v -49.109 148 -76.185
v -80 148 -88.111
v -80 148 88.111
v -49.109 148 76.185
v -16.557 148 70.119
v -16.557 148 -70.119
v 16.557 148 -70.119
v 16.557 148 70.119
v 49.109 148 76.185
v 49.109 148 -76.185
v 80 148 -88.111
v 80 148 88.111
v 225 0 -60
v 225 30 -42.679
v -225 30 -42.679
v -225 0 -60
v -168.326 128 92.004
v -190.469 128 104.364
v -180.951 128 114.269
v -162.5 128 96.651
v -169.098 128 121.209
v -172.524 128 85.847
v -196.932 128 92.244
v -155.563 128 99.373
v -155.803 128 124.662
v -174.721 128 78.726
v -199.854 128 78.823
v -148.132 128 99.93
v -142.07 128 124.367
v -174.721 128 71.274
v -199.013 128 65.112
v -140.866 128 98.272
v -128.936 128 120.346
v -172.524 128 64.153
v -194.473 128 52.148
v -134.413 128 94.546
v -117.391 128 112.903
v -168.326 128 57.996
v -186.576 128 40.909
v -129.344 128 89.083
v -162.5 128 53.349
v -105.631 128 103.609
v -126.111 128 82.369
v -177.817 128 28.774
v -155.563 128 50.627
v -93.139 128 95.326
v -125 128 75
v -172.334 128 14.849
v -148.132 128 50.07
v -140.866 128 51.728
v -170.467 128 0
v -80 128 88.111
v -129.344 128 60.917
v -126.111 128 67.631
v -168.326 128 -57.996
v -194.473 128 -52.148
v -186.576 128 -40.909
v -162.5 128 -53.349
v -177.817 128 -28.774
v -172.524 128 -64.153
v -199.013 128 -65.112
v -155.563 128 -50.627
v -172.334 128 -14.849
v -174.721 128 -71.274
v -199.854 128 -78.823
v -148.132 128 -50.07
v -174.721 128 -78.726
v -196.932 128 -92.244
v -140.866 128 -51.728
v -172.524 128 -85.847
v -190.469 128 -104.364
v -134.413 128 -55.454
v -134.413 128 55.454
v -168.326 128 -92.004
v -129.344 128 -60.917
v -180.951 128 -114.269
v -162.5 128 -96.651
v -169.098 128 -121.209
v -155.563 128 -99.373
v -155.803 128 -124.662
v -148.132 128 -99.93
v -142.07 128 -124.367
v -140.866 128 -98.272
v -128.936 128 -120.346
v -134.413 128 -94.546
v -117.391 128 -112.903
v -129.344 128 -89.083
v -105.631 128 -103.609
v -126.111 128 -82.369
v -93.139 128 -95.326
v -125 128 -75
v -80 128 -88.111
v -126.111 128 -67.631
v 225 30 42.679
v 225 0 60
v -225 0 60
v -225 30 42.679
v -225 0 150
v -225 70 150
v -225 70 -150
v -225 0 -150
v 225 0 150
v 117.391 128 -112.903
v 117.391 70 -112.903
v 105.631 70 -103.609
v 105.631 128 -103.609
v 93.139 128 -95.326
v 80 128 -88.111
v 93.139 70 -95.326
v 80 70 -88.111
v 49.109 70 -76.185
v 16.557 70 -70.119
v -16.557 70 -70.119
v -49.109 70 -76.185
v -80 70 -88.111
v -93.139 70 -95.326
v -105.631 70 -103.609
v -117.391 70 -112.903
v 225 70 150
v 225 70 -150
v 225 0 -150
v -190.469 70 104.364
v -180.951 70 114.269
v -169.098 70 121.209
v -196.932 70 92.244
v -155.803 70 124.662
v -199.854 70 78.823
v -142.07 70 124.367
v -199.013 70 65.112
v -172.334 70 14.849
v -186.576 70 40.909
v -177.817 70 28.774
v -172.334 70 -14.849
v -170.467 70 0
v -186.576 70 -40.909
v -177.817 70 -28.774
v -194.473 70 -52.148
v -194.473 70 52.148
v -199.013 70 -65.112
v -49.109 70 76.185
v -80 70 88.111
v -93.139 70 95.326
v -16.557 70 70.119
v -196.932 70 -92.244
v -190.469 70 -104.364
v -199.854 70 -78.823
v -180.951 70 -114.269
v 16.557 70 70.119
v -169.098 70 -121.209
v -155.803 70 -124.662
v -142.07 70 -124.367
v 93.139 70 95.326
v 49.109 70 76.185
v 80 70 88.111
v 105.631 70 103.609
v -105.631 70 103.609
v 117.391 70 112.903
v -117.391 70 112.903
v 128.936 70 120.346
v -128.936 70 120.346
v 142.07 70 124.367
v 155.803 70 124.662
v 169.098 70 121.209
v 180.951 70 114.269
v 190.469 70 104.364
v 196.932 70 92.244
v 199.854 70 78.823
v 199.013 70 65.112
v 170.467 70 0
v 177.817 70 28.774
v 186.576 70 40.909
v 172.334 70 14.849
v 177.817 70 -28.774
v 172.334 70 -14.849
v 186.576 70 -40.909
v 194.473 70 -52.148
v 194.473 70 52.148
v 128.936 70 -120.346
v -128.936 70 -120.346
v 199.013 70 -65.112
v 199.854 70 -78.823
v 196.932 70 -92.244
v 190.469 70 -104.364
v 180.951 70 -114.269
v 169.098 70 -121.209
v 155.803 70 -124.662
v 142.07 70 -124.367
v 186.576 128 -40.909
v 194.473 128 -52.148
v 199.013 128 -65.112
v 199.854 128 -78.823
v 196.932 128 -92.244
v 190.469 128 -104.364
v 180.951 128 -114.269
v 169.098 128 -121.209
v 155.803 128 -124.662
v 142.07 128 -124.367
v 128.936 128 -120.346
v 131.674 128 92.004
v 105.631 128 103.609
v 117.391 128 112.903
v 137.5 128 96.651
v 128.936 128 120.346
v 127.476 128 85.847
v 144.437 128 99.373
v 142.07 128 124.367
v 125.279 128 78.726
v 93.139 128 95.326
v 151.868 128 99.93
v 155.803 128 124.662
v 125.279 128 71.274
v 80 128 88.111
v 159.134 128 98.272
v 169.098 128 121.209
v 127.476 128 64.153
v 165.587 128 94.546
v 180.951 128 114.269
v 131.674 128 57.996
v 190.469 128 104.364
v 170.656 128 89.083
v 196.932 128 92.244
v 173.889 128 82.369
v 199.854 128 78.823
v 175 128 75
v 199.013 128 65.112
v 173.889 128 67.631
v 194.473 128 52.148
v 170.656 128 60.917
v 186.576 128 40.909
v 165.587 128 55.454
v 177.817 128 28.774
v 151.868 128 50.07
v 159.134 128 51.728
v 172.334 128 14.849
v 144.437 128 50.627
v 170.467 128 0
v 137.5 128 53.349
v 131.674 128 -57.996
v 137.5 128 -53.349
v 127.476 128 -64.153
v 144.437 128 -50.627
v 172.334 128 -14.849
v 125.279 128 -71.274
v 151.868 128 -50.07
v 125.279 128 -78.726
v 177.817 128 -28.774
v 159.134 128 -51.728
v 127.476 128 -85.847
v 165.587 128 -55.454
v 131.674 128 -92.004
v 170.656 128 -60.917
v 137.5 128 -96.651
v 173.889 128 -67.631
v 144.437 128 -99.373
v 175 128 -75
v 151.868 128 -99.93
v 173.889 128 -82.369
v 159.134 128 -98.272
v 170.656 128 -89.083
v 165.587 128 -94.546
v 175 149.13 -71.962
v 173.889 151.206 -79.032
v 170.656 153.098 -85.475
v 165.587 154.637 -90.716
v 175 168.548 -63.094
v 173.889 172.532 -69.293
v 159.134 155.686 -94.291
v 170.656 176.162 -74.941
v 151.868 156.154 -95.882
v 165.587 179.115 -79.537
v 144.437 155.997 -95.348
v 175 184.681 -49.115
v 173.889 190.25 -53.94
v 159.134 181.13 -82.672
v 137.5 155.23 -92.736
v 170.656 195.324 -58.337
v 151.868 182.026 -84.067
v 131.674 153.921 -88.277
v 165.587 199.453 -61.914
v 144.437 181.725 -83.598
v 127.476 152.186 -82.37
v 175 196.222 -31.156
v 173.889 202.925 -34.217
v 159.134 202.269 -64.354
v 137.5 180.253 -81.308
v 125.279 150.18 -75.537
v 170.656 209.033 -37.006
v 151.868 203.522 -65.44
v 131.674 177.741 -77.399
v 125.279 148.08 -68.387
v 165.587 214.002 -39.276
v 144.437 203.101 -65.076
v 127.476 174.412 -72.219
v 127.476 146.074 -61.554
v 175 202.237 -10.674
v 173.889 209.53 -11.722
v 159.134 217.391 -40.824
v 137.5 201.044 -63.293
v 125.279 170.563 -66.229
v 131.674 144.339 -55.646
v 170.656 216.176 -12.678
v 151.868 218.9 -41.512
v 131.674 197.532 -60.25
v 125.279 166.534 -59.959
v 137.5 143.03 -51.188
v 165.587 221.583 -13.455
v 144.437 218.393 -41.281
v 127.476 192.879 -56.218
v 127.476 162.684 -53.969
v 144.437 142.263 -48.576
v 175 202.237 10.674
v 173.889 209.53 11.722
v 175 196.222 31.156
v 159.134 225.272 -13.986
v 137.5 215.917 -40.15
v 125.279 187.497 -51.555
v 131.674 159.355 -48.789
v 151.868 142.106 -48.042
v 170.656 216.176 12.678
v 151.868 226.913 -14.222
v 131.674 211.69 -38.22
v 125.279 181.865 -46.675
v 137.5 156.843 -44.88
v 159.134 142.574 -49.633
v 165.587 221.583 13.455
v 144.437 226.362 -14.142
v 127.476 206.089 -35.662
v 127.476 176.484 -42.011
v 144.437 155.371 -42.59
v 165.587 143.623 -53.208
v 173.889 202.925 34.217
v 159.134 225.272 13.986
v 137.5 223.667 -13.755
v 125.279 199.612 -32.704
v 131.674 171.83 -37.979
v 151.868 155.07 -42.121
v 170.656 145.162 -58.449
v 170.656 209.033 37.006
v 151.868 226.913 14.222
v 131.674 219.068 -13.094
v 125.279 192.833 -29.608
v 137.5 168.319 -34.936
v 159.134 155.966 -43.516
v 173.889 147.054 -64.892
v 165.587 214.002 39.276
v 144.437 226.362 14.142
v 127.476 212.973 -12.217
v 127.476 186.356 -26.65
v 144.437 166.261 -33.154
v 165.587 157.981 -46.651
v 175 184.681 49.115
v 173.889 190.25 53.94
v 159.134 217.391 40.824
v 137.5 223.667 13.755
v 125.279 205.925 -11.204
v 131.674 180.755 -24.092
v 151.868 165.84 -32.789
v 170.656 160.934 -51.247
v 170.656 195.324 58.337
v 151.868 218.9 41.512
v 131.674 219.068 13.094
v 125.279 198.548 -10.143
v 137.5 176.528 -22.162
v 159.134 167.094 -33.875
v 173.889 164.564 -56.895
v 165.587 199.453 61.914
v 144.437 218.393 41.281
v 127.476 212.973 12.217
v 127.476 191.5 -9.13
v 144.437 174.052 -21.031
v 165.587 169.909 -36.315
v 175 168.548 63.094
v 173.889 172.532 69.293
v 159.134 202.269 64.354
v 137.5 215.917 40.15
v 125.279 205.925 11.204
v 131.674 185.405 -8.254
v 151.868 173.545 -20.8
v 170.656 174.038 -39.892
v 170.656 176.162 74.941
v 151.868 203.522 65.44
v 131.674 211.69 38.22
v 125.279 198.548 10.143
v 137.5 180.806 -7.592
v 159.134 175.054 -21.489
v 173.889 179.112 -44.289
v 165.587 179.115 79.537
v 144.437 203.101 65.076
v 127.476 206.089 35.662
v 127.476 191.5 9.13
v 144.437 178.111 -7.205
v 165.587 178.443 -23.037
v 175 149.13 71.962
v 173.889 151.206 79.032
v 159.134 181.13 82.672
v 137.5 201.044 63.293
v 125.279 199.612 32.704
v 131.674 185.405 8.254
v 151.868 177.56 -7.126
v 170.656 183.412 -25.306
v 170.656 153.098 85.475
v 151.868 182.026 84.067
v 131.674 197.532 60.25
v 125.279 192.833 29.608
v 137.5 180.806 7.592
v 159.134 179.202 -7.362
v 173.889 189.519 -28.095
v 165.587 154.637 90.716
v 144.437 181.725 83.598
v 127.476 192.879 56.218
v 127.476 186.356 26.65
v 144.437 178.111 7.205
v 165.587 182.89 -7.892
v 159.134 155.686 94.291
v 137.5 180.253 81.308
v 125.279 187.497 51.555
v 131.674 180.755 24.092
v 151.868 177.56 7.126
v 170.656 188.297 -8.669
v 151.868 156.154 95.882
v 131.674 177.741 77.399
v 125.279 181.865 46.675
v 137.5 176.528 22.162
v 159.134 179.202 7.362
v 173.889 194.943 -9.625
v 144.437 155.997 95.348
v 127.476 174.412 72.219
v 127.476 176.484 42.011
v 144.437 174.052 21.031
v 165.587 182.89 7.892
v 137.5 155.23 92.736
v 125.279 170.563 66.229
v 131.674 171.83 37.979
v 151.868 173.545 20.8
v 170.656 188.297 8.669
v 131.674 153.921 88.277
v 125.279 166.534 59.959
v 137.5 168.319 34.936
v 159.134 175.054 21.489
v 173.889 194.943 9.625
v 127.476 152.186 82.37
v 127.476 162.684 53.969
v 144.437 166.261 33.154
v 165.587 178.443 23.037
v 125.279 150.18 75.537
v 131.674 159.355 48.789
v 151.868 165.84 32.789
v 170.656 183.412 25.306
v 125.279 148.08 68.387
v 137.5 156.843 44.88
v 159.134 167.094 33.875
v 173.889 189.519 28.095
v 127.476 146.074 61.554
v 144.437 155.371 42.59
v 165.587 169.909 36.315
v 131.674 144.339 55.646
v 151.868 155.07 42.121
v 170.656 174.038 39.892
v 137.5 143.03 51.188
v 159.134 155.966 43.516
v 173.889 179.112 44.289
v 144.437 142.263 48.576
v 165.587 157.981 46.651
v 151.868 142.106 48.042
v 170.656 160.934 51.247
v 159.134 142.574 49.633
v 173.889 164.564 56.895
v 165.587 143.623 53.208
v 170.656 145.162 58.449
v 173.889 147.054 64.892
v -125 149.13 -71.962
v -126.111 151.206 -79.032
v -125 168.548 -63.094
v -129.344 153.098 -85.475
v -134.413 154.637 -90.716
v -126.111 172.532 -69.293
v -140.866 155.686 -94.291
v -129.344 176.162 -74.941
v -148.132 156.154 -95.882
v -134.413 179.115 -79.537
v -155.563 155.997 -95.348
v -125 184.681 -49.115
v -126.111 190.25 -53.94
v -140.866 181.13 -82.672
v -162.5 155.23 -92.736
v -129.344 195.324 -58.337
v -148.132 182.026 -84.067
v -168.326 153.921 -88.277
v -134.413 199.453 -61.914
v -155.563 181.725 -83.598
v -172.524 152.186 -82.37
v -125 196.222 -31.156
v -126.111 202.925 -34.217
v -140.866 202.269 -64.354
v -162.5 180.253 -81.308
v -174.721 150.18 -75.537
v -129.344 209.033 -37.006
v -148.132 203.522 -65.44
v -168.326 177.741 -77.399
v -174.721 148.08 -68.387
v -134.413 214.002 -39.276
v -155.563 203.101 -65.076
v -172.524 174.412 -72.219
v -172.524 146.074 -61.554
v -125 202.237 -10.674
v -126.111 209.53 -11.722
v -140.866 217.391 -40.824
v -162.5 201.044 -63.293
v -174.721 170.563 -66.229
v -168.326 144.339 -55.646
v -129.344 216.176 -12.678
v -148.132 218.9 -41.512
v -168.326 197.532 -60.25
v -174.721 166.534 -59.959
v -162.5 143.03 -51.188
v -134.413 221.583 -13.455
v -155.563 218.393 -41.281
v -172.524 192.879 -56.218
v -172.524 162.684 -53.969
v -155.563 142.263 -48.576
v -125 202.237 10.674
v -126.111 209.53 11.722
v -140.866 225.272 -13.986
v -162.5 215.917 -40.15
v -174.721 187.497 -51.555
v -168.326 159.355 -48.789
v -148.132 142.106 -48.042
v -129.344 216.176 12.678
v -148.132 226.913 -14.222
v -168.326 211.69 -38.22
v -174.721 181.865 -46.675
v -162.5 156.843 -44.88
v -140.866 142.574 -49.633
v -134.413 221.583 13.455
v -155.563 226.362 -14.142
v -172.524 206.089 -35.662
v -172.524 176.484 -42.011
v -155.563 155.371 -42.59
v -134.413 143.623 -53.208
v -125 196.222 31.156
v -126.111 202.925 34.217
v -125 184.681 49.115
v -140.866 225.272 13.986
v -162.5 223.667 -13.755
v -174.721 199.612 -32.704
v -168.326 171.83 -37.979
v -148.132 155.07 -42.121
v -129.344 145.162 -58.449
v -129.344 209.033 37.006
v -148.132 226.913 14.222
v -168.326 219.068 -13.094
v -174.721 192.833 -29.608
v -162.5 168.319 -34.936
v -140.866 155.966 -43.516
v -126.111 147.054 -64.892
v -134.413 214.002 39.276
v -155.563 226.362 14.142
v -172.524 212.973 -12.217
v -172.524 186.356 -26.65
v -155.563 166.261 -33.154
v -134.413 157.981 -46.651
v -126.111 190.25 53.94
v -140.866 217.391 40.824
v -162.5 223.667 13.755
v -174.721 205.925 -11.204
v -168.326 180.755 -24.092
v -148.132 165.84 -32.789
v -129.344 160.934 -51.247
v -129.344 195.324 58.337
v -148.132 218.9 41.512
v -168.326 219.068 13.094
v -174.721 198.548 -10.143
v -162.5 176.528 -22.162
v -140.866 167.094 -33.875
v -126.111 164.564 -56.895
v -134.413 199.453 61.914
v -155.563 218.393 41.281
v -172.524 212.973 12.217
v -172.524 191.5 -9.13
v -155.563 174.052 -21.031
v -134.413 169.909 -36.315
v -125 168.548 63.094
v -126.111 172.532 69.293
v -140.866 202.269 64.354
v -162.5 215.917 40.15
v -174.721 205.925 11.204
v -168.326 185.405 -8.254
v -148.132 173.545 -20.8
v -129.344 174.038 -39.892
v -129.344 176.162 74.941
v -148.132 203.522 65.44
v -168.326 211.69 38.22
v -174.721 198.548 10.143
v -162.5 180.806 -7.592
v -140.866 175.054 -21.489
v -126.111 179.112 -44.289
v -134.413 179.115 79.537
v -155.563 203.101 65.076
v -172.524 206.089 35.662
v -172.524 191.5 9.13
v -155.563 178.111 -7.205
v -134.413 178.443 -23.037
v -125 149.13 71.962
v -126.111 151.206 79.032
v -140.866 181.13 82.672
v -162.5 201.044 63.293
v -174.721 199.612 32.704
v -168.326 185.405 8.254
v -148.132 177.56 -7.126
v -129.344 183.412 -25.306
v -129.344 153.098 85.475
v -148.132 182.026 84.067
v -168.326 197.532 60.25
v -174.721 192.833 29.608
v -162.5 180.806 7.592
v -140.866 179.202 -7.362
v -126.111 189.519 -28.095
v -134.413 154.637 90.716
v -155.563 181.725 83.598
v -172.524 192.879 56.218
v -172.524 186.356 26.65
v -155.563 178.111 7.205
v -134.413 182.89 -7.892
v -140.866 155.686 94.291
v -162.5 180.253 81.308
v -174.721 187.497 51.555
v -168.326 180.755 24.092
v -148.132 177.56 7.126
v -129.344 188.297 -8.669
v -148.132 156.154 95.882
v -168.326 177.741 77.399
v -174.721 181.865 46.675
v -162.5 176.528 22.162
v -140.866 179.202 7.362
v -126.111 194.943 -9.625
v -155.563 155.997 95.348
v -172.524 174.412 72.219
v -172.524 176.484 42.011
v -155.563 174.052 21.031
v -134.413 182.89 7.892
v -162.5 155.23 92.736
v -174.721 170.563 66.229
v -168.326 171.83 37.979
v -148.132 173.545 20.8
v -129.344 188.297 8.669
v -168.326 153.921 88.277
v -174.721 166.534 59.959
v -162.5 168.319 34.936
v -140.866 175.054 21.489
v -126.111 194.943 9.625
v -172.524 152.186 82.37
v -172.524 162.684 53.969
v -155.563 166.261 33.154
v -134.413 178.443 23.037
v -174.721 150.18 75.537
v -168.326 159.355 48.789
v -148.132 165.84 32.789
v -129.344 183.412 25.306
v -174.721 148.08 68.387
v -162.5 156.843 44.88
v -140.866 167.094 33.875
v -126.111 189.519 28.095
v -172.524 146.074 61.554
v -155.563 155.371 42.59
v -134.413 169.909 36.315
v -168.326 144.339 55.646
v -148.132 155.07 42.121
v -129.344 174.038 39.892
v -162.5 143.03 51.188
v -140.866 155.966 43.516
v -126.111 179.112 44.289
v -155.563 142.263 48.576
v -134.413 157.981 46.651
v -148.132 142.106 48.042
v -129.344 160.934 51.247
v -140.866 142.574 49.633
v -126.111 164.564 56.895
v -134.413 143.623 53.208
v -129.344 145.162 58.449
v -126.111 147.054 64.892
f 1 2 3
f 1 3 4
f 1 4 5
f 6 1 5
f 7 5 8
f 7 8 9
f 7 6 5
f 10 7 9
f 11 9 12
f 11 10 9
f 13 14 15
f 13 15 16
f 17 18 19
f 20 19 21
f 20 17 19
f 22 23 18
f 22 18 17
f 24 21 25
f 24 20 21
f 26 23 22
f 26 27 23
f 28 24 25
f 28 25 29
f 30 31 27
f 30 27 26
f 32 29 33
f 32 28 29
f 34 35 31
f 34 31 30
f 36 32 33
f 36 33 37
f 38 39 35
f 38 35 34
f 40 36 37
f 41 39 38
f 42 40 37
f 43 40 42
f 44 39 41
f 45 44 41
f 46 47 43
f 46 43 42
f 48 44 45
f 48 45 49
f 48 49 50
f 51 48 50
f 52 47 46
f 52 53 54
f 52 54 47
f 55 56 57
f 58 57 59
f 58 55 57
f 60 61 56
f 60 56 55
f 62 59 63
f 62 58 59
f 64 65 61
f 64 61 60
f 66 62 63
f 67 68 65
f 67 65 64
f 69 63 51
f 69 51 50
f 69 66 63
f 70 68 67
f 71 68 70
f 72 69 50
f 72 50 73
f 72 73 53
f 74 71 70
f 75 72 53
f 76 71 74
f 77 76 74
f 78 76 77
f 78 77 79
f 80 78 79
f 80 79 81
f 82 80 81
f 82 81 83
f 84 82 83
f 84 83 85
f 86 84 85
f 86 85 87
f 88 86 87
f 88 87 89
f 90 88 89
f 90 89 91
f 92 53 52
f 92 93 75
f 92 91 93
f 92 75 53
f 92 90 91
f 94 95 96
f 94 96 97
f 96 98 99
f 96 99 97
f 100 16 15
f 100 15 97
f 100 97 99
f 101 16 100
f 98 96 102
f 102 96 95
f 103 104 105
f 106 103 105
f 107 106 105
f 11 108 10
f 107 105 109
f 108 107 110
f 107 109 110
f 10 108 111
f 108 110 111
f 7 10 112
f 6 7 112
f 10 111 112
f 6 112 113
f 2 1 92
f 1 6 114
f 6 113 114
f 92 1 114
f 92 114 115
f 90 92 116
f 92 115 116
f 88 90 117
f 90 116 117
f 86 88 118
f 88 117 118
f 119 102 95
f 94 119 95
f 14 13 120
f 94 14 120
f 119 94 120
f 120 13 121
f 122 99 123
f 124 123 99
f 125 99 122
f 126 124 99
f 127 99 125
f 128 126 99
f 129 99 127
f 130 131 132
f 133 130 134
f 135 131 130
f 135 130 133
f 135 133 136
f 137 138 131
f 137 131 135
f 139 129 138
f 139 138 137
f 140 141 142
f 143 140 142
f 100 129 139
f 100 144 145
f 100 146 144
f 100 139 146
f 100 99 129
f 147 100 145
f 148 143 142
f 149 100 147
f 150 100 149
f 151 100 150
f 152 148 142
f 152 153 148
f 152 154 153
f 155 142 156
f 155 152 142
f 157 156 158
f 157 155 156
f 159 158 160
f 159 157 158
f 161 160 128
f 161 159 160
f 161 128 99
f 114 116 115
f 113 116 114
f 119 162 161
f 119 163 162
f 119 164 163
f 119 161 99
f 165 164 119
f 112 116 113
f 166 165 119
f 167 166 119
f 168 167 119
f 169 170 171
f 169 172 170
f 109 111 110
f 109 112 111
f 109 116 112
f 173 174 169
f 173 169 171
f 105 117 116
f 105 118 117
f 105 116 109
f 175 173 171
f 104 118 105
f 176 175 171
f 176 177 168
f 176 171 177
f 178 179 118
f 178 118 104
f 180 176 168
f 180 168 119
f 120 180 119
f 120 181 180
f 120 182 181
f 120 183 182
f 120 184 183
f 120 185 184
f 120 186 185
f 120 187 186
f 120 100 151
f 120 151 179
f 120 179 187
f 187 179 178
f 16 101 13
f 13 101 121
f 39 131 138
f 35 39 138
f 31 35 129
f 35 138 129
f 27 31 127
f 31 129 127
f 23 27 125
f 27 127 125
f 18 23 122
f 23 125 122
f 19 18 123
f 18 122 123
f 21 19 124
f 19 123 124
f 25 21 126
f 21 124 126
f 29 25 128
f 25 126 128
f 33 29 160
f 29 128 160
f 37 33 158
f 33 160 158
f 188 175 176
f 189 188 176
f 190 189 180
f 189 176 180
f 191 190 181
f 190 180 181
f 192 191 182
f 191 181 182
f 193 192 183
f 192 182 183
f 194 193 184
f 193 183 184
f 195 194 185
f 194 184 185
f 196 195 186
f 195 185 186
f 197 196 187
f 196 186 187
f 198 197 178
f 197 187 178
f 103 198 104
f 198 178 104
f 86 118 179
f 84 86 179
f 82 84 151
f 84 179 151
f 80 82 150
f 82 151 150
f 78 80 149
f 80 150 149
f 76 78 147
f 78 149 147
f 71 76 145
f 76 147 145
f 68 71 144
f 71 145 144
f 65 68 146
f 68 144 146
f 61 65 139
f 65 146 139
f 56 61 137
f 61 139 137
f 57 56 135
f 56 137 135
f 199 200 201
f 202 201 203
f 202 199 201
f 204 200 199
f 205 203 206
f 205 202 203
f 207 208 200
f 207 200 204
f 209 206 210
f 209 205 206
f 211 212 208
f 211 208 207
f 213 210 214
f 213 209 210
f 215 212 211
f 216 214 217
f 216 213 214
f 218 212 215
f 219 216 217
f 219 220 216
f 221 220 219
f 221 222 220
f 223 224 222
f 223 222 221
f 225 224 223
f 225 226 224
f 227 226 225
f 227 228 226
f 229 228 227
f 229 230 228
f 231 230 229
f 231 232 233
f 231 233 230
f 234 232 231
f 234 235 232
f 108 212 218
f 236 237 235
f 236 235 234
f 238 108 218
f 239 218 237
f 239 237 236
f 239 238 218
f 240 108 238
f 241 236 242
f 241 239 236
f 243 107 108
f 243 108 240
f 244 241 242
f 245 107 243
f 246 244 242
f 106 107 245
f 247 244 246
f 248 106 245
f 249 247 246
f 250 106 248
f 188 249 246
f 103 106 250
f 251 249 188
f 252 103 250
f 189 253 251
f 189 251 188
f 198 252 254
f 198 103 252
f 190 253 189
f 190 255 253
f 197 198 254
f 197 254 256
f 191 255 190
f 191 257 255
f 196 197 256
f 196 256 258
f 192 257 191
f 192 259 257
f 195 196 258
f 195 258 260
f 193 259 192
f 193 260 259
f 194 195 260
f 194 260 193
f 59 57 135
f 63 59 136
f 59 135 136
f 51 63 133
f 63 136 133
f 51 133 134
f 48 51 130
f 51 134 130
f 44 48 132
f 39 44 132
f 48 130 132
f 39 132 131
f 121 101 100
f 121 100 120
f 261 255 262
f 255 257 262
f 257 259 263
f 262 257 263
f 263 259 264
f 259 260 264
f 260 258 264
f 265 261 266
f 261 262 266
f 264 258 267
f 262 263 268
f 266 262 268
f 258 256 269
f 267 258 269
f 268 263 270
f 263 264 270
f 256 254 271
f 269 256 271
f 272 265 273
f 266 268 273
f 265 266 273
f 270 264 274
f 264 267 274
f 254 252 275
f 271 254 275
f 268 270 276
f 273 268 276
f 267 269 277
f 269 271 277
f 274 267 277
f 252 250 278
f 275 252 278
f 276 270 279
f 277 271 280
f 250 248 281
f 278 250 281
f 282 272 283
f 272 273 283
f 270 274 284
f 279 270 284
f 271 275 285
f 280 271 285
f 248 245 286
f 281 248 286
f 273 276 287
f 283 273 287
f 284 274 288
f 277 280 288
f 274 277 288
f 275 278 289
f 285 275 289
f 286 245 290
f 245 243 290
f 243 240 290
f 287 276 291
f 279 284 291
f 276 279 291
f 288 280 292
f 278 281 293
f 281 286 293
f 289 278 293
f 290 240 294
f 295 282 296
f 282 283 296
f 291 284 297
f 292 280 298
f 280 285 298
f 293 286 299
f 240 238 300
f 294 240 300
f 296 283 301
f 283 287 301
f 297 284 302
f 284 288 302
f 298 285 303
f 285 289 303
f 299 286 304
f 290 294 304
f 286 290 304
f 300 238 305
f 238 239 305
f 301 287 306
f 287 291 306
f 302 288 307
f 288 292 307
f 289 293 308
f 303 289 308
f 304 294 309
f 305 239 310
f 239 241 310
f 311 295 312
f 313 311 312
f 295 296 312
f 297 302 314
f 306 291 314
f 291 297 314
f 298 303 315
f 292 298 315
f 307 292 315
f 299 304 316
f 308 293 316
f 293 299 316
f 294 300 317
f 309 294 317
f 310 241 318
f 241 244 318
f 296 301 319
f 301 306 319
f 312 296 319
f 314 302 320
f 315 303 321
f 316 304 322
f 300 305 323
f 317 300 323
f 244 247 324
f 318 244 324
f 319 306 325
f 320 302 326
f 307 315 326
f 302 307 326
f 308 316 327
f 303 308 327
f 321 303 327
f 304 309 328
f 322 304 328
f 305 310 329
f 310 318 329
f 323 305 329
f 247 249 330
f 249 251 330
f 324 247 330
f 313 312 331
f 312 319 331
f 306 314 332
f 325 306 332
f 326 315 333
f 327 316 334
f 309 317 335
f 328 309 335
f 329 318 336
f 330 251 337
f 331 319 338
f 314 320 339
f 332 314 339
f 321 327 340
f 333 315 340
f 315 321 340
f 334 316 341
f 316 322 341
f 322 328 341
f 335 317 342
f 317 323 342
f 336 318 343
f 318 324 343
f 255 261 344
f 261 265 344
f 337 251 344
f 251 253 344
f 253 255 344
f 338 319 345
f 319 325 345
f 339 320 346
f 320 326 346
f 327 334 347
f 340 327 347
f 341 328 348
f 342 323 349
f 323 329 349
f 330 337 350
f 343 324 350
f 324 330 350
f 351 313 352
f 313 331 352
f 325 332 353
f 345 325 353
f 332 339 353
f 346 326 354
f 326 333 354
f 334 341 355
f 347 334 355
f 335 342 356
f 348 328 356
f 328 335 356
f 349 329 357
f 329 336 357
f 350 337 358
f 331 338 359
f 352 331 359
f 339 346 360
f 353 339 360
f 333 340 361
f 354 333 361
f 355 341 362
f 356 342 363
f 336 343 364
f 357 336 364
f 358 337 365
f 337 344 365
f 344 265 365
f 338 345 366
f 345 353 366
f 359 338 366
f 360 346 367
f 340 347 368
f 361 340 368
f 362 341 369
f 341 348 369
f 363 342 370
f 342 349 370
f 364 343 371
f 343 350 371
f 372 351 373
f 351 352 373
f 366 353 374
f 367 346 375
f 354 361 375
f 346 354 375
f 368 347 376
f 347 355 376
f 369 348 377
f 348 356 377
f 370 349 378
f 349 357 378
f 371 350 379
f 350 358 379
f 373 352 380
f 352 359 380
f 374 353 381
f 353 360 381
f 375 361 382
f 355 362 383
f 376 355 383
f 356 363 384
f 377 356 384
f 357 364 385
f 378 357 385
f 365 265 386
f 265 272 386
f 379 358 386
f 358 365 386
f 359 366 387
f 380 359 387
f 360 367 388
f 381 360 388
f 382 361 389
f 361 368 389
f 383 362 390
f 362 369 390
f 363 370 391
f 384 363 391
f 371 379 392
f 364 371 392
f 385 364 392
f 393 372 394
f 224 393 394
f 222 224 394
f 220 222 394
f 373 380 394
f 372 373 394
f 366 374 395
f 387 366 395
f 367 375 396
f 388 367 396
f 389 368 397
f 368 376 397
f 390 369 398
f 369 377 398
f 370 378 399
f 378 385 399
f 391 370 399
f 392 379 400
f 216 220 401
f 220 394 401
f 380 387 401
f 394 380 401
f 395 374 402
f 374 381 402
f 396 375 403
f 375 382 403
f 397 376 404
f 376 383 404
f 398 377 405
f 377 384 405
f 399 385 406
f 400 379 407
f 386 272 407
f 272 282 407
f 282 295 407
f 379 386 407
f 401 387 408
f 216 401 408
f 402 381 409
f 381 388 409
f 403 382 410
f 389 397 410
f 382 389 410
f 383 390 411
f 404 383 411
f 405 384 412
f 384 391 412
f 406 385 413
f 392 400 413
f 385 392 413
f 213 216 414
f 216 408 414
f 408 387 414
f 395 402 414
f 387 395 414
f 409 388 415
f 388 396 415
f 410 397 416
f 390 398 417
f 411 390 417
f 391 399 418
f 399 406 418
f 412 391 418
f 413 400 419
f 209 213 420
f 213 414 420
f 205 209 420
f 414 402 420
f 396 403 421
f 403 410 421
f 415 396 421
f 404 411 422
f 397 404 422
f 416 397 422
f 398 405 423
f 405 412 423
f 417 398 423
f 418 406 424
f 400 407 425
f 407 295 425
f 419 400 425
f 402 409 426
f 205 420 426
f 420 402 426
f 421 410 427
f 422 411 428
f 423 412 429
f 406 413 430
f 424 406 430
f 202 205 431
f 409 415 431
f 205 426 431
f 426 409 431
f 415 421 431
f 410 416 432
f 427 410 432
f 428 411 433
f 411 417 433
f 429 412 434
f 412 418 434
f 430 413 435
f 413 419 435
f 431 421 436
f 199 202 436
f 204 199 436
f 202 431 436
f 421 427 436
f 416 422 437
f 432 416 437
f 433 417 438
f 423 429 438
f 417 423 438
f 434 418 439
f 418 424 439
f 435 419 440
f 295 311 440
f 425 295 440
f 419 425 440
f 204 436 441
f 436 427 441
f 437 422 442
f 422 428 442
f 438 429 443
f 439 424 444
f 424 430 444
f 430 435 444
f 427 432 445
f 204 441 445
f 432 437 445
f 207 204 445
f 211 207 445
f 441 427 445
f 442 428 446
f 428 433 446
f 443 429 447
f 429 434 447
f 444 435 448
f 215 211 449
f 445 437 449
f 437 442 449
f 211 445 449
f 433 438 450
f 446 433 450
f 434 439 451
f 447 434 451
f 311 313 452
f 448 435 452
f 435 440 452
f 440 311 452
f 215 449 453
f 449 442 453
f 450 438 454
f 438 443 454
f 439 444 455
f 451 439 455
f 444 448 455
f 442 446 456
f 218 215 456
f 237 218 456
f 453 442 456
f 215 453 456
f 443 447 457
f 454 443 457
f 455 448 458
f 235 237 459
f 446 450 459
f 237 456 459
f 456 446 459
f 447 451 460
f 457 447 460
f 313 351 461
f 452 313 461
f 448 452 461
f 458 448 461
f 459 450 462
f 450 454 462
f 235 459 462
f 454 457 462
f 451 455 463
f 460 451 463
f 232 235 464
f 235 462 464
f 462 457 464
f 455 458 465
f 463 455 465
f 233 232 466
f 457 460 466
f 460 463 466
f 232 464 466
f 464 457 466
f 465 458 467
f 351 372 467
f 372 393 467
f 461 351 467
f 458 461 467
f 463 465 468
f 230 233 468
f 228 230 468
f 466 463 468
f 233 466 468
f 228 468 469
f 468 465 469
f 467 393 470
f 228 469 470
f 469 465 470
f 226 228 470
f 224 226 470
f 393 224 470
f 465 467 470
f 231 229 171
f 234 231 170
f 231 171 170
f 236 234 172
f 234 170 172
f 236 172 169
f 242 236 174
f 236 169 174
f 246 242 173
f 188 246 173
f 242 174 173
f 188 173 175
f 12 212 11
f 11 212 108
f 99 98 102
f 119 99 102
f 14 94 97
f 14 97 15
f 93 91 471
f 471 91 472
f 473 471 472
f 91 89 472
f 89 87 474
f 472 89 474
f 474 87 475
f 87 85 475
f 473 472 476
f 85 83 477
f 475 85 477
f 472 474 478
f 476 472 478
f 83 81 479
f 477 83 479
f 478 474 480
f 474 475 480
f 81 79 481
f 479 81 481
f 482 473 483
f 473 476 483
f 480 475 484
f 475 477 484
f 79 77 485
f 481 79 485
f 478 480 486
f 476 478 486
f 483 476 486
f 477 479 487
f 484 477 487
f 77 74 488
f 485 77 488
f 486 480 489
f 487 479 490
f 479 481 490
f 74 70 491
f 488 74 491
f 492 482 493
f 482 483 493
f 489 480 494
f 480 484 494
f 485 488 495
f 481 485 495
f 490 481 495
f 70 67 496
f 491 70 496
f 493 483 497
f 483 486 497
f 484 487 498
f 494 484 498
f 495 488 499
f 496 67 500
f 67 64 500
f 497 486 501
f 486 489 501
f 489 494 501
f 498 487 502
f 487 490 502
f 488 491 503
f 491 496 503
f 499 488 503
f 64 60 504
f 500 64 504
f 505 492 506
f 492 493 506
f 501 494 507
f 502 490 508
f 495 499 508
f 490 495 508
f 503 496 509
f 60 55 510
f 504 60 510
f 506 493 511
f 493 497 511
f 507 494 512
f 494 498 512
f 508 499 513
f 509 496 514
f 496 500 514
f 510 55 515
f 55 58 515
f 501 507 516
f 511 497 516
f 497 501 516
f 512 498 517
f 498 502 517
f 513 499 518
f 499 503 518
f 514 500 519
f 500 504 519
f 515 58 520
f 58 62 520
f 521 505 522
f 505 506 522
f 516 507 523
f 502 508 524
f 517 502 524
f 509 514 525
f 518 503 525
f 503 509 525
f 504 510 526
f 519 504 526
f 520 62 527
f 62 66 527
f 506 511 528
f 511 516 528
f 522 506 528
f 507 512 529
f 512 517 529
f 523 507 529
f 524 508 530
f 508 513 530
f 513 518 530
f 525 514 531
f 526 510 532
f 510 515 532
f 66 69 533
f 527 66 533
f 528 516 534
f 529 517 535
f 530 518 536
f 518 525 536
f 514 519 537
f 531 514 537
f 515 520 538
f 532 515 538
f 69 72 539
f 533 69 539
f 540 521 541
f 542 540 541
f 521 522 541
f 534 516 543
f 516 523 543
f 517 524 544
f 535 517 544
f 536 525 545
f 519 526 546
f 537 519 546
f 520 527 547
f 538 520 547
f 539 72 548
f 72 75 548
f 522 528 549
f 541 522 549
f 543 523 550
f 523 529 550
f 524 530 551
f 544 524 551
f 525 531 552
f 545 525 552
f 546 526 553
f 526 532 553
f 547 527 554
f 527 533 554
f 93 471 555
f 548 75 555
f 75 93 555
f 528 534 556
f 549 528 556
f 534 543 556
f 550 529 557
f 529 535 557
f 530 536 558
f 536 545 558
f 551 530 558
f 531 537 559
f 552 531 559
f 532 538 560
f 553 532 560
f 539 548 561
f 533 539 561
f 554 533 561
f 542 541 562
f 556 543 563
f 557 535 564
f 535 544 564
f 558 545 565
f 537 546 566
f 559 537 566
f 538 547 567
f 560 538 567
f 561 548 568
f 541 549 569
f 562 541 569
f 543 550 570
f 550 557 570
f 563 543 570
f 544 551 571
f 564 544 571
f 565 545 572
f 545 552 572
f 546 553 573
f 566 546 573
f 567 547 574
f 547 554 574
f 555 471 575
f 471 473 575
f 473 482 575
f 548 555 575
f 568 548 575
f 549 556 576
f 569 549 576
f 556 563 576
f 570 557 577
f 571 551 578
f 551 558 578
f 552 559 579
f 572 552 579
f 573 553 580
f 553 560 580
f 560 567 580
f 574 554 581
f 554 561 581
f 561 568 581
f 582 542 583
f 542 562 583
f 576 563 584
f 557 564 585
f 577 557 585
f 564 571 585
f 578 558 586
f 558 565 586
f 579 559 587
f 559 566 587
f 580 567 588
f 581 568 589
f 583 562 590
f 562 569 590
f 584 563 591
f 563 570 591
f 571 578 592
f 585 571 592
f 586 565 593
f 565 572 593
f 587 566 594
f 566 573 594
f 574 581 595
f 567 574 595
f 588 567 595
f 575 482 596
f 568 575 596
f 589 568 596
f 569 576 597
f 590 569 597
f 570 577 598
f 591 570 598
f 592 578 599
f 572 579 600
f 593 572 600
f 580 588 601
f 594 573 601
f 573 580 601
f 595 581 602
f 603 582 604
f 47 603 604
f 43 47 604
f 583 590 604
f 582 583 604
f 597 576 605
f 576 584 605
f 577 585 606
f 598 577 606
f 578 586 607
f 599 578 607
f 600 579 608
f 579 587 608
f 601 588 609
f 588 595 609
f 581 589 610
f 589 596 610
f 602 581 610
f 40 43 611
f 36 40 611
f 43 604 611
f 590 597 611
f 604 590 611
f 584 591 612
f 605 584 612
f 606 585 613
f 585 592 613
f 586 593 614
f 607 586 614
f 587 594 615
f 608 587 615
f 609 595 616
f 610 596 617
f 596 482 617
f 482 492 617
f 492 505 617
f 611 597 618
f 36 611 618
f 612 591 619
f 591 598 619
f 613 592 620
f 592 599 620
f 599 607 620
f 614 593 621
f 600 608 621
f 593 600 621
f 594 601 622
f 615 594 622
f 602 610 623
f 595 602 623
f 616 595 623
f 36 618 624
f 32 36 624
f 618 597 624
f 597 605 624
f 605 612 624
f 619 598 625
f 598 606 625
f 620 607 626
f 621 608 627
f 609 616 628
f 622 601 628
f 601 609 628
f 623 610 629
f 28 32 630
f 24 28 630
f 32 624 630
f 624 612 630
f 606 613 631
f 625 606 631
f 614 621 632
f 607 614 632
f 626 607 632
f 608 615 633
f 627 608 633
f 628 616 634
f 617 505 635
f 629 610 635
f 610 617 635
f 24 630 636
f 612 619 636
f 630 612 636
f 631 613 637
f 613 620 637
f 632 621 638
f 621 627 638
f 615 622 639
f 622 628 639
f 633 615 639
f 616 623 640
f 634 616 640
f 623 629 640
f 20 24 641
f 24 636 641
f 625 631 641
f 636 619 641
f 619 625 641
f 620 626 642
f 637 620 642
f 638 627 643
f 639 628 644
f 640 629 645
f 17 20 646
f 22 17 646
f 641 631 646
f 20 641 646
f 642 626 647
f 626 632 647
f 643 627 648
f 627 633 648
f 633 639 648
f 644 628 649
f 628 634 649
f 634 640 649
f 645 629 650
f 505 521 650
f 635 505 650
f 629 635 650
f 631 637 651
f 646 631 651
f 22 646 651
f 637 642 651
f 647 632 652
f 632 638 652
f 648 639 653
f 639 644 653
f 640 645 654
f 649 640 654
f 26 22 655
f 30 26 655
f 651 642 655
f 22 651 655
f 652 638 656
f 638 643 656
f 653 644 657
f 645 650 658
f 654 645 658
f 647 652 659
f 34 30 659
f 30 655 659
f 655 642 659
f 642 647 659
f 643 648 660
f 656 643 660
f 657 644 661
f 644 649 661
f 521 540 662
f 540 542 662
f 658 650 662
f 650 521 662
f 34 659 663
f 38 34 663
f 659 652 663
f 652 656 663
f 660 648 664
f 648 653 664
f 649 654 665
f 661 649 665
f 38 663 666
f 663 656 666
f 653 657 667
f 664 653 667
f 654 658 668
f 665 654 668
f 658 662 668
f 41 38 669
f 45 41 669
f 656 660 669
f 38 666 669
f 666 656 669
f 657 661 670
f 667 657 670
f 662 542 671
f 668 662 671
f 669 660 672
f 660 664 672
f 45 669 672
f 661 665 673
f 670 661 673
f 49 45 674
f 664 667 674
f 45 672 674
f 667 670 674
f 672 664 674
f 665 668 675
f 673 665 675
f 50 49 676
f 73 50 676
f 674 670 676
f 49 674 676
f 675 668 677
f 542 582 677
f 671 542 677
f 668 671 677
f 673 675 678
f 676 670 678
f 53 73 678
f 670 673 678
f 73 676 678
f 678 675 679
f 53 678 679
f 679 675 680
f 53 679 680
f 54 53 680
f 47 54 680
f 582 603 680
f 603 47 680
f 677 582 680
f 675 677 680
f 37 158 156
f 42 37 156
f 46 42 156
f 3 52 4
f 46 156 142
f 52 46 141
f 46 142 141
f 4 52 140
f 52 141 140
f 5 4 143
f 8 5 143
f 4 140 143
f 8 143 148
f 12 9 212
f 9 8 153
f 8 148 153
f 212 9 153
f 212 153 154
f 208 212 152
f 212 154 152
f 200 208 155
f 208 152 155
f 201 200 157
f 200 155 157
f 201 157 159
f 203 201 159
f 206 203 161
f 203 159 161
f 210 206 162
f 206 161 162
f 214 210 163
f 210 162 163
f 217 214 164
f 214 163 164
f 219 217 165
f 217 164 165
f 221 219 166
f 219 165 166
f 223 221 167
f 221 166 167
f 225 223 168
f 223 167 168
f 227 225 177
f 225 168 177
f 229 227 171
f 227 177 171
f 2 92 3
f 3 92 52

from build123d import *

# Parameters (mm, degrees)
SKETCH1_W           = 450
SKETCH1_H           = 300
BOSS_EXTRUDE1_DEPTH = 70
CUT_EXTRUDE1_DEPTH  = 451
SKETCH3_R           = 25
BOSS_EXTRUDE2_DEPTH = 58
BOSS_EXTRUDE3_DEPTH = 20
SKETCH5_R           = 25
REVOLVE1_ANGLE      = 180


with BuildPart() as part:
    # Sketch1 → Boss-Extrude1 (new body)
    with BuildSketch(Plane(origin=(0, 0, 0), x_dir=(1, 0, 0), z_dir=(0, 1, 0))):
        Rectangle(SKETCH1_W, SKETCH1_H)
    extrude(amount=BOSS_EXTRUDE1_DEPTH)

    # Sketch2 → Cut-Extrude1 (cut, through all)
    with BuildSketch(Plane(origin=(225, 0, 0), x_dir=(0, 0, -1), z_dir=(1, 0, 0))):
        Polygon((-60, 0), (-42.679491924, 30), (42.679491924, 30), (60, 0), align=None)
    extrude(amount=-CUT_EXTRUDE1_DEPTH, mode=Mode.SUBTRACT)

    # Sketch3 → Boss-Extrude2 (add)
    with BuildSketch(Plane(origin=(0, 70, 0), x_dir=(1, 0, 0), z_dir=(0, 1, 0))):
        with BuildLine():
            Line((-80, -88.110802776), (-80, 88.110802776))
            ThreePointArc((-80, 88.110802776), (-99.471105521, 99.337628307), (-117.391304348, 112.903469074))
            ThreePointArc((-117.391304348, 112.903469074), (-186.051805285, 109.644874595), (-186.576083953, 40.909090909))
            ThreePointArc((-186.576083953, 40.909090909), (-170.467384697, 0), (-186.576083953, -40.909090909))
            ThreePointArc((-186.576083953, -40.909090909), (-186.051805285, -109.644874595), (-117.391304348, -112.903469074))
            ThreePointArc((-117.391304348, -112.903469074), (-99.471105521, -99.337628307), (-80, -88.110802776))
        make_face()
        with Locations((-150, -75)):
            Circle(SKETCH3_R, mode=Mode.SUBTRACT)
        with Locations((-150, 75)):
            Circle(SKETCH3_R, mode=Mode.SUBTRACT)
        with BuildLine():
            ThreePointArc((80, 88.110802776), (0, 69.355957742), (-80, 88.110802776))
            Line((-80, 88.110802776), (-80, -88.110802776))
            ThreePointArc((-80, -88.110802776), (0, -69.355957742), (80, -88.110802776))
            Line((80, -88.110802776), (80, 88.110802776))
        make_face()
        with BuildLine():
            ThreePointArc((117.391304348, 112.903469074), (99.471105521, 99.337628307), (80, 88.110802776))
            Line((80, 88.110802776), (80, -88.110802776))
            ThreePointArc((80, -88.110802776), (99.471105521, -99.337628307), (117.391304348, -112.903469074))
            ThreePointArc((117.391304348, -112.903469074), (186.051805285, -109.644874595), (186.576083953, -40.909090909))
            ThreePointArc((186.576083953, -40.909090909), (170.467384697, 0), (186.576083953, 40.909090909))
            ThreePointArc((186.576083953, 40.909090909), (186.051805285, 109.644874595), (117.391304348, 112.903469074))
        make_face()
        with Locations((150, -75)):
            Circle(SKETCH3_R, mode=Mode.SUBTRACT)
        with Locations((150, 75)):
            Circle(SKETCH3_R, mode=Mode.SUBTRACT)
        with Locations((-150, 75)):
            Circle(SKETCH3_R)
        with Locations((-150, -75)):
            Circle(SKETCH3_R)
        with Locations((150, -75)):
            Circle(SKETCH3_R)
        with Locations((150, 75)):
            Circle(SKETCH3_R)
    extrude(amount=BOSS_EXTRUDE2_DEPTH)

    # Sketch4 → Boss-Extrude3 (add)
    with BuildSketch(Plane(origin=(0, 128, 0), x_dir=(1, 0, 0), z_dir=(0, 1, 0))):
        with BuildLine():
            Line((-80, 88.110802776), (-80, -88.110802776))
            ThreePointArc((-80, -88.110802776), (0, -69.355957742), (80, -88.110802776))
            Line((80, -88.110802776), (80, 88.110802776))
            ThreePointArc((80, 88.110802776), (0, 69.355957742), (-80, 88.110802776))
        make_face()
    extrude(amount=BOSS_EXTRUDE3_DEPTH)

    # Sketch5 → Revolve1 (revolve)
    with BuildSketch(Plane(origin=(0, 128, 0), x_dir=(1, 0, 0), z_dir=(0, 1, 0))):
        with Locations((-150, 75)):
            Circle(SKETCH5_R)
        with Locations((150, 75)):
            Circle(SKETCH5_R)
    revolve(axis=Axis((-226.209198956, 128, 0), (1, 0, 0)), revolution_arc=REVOLVE1_ANGLE)


solid = part.part
